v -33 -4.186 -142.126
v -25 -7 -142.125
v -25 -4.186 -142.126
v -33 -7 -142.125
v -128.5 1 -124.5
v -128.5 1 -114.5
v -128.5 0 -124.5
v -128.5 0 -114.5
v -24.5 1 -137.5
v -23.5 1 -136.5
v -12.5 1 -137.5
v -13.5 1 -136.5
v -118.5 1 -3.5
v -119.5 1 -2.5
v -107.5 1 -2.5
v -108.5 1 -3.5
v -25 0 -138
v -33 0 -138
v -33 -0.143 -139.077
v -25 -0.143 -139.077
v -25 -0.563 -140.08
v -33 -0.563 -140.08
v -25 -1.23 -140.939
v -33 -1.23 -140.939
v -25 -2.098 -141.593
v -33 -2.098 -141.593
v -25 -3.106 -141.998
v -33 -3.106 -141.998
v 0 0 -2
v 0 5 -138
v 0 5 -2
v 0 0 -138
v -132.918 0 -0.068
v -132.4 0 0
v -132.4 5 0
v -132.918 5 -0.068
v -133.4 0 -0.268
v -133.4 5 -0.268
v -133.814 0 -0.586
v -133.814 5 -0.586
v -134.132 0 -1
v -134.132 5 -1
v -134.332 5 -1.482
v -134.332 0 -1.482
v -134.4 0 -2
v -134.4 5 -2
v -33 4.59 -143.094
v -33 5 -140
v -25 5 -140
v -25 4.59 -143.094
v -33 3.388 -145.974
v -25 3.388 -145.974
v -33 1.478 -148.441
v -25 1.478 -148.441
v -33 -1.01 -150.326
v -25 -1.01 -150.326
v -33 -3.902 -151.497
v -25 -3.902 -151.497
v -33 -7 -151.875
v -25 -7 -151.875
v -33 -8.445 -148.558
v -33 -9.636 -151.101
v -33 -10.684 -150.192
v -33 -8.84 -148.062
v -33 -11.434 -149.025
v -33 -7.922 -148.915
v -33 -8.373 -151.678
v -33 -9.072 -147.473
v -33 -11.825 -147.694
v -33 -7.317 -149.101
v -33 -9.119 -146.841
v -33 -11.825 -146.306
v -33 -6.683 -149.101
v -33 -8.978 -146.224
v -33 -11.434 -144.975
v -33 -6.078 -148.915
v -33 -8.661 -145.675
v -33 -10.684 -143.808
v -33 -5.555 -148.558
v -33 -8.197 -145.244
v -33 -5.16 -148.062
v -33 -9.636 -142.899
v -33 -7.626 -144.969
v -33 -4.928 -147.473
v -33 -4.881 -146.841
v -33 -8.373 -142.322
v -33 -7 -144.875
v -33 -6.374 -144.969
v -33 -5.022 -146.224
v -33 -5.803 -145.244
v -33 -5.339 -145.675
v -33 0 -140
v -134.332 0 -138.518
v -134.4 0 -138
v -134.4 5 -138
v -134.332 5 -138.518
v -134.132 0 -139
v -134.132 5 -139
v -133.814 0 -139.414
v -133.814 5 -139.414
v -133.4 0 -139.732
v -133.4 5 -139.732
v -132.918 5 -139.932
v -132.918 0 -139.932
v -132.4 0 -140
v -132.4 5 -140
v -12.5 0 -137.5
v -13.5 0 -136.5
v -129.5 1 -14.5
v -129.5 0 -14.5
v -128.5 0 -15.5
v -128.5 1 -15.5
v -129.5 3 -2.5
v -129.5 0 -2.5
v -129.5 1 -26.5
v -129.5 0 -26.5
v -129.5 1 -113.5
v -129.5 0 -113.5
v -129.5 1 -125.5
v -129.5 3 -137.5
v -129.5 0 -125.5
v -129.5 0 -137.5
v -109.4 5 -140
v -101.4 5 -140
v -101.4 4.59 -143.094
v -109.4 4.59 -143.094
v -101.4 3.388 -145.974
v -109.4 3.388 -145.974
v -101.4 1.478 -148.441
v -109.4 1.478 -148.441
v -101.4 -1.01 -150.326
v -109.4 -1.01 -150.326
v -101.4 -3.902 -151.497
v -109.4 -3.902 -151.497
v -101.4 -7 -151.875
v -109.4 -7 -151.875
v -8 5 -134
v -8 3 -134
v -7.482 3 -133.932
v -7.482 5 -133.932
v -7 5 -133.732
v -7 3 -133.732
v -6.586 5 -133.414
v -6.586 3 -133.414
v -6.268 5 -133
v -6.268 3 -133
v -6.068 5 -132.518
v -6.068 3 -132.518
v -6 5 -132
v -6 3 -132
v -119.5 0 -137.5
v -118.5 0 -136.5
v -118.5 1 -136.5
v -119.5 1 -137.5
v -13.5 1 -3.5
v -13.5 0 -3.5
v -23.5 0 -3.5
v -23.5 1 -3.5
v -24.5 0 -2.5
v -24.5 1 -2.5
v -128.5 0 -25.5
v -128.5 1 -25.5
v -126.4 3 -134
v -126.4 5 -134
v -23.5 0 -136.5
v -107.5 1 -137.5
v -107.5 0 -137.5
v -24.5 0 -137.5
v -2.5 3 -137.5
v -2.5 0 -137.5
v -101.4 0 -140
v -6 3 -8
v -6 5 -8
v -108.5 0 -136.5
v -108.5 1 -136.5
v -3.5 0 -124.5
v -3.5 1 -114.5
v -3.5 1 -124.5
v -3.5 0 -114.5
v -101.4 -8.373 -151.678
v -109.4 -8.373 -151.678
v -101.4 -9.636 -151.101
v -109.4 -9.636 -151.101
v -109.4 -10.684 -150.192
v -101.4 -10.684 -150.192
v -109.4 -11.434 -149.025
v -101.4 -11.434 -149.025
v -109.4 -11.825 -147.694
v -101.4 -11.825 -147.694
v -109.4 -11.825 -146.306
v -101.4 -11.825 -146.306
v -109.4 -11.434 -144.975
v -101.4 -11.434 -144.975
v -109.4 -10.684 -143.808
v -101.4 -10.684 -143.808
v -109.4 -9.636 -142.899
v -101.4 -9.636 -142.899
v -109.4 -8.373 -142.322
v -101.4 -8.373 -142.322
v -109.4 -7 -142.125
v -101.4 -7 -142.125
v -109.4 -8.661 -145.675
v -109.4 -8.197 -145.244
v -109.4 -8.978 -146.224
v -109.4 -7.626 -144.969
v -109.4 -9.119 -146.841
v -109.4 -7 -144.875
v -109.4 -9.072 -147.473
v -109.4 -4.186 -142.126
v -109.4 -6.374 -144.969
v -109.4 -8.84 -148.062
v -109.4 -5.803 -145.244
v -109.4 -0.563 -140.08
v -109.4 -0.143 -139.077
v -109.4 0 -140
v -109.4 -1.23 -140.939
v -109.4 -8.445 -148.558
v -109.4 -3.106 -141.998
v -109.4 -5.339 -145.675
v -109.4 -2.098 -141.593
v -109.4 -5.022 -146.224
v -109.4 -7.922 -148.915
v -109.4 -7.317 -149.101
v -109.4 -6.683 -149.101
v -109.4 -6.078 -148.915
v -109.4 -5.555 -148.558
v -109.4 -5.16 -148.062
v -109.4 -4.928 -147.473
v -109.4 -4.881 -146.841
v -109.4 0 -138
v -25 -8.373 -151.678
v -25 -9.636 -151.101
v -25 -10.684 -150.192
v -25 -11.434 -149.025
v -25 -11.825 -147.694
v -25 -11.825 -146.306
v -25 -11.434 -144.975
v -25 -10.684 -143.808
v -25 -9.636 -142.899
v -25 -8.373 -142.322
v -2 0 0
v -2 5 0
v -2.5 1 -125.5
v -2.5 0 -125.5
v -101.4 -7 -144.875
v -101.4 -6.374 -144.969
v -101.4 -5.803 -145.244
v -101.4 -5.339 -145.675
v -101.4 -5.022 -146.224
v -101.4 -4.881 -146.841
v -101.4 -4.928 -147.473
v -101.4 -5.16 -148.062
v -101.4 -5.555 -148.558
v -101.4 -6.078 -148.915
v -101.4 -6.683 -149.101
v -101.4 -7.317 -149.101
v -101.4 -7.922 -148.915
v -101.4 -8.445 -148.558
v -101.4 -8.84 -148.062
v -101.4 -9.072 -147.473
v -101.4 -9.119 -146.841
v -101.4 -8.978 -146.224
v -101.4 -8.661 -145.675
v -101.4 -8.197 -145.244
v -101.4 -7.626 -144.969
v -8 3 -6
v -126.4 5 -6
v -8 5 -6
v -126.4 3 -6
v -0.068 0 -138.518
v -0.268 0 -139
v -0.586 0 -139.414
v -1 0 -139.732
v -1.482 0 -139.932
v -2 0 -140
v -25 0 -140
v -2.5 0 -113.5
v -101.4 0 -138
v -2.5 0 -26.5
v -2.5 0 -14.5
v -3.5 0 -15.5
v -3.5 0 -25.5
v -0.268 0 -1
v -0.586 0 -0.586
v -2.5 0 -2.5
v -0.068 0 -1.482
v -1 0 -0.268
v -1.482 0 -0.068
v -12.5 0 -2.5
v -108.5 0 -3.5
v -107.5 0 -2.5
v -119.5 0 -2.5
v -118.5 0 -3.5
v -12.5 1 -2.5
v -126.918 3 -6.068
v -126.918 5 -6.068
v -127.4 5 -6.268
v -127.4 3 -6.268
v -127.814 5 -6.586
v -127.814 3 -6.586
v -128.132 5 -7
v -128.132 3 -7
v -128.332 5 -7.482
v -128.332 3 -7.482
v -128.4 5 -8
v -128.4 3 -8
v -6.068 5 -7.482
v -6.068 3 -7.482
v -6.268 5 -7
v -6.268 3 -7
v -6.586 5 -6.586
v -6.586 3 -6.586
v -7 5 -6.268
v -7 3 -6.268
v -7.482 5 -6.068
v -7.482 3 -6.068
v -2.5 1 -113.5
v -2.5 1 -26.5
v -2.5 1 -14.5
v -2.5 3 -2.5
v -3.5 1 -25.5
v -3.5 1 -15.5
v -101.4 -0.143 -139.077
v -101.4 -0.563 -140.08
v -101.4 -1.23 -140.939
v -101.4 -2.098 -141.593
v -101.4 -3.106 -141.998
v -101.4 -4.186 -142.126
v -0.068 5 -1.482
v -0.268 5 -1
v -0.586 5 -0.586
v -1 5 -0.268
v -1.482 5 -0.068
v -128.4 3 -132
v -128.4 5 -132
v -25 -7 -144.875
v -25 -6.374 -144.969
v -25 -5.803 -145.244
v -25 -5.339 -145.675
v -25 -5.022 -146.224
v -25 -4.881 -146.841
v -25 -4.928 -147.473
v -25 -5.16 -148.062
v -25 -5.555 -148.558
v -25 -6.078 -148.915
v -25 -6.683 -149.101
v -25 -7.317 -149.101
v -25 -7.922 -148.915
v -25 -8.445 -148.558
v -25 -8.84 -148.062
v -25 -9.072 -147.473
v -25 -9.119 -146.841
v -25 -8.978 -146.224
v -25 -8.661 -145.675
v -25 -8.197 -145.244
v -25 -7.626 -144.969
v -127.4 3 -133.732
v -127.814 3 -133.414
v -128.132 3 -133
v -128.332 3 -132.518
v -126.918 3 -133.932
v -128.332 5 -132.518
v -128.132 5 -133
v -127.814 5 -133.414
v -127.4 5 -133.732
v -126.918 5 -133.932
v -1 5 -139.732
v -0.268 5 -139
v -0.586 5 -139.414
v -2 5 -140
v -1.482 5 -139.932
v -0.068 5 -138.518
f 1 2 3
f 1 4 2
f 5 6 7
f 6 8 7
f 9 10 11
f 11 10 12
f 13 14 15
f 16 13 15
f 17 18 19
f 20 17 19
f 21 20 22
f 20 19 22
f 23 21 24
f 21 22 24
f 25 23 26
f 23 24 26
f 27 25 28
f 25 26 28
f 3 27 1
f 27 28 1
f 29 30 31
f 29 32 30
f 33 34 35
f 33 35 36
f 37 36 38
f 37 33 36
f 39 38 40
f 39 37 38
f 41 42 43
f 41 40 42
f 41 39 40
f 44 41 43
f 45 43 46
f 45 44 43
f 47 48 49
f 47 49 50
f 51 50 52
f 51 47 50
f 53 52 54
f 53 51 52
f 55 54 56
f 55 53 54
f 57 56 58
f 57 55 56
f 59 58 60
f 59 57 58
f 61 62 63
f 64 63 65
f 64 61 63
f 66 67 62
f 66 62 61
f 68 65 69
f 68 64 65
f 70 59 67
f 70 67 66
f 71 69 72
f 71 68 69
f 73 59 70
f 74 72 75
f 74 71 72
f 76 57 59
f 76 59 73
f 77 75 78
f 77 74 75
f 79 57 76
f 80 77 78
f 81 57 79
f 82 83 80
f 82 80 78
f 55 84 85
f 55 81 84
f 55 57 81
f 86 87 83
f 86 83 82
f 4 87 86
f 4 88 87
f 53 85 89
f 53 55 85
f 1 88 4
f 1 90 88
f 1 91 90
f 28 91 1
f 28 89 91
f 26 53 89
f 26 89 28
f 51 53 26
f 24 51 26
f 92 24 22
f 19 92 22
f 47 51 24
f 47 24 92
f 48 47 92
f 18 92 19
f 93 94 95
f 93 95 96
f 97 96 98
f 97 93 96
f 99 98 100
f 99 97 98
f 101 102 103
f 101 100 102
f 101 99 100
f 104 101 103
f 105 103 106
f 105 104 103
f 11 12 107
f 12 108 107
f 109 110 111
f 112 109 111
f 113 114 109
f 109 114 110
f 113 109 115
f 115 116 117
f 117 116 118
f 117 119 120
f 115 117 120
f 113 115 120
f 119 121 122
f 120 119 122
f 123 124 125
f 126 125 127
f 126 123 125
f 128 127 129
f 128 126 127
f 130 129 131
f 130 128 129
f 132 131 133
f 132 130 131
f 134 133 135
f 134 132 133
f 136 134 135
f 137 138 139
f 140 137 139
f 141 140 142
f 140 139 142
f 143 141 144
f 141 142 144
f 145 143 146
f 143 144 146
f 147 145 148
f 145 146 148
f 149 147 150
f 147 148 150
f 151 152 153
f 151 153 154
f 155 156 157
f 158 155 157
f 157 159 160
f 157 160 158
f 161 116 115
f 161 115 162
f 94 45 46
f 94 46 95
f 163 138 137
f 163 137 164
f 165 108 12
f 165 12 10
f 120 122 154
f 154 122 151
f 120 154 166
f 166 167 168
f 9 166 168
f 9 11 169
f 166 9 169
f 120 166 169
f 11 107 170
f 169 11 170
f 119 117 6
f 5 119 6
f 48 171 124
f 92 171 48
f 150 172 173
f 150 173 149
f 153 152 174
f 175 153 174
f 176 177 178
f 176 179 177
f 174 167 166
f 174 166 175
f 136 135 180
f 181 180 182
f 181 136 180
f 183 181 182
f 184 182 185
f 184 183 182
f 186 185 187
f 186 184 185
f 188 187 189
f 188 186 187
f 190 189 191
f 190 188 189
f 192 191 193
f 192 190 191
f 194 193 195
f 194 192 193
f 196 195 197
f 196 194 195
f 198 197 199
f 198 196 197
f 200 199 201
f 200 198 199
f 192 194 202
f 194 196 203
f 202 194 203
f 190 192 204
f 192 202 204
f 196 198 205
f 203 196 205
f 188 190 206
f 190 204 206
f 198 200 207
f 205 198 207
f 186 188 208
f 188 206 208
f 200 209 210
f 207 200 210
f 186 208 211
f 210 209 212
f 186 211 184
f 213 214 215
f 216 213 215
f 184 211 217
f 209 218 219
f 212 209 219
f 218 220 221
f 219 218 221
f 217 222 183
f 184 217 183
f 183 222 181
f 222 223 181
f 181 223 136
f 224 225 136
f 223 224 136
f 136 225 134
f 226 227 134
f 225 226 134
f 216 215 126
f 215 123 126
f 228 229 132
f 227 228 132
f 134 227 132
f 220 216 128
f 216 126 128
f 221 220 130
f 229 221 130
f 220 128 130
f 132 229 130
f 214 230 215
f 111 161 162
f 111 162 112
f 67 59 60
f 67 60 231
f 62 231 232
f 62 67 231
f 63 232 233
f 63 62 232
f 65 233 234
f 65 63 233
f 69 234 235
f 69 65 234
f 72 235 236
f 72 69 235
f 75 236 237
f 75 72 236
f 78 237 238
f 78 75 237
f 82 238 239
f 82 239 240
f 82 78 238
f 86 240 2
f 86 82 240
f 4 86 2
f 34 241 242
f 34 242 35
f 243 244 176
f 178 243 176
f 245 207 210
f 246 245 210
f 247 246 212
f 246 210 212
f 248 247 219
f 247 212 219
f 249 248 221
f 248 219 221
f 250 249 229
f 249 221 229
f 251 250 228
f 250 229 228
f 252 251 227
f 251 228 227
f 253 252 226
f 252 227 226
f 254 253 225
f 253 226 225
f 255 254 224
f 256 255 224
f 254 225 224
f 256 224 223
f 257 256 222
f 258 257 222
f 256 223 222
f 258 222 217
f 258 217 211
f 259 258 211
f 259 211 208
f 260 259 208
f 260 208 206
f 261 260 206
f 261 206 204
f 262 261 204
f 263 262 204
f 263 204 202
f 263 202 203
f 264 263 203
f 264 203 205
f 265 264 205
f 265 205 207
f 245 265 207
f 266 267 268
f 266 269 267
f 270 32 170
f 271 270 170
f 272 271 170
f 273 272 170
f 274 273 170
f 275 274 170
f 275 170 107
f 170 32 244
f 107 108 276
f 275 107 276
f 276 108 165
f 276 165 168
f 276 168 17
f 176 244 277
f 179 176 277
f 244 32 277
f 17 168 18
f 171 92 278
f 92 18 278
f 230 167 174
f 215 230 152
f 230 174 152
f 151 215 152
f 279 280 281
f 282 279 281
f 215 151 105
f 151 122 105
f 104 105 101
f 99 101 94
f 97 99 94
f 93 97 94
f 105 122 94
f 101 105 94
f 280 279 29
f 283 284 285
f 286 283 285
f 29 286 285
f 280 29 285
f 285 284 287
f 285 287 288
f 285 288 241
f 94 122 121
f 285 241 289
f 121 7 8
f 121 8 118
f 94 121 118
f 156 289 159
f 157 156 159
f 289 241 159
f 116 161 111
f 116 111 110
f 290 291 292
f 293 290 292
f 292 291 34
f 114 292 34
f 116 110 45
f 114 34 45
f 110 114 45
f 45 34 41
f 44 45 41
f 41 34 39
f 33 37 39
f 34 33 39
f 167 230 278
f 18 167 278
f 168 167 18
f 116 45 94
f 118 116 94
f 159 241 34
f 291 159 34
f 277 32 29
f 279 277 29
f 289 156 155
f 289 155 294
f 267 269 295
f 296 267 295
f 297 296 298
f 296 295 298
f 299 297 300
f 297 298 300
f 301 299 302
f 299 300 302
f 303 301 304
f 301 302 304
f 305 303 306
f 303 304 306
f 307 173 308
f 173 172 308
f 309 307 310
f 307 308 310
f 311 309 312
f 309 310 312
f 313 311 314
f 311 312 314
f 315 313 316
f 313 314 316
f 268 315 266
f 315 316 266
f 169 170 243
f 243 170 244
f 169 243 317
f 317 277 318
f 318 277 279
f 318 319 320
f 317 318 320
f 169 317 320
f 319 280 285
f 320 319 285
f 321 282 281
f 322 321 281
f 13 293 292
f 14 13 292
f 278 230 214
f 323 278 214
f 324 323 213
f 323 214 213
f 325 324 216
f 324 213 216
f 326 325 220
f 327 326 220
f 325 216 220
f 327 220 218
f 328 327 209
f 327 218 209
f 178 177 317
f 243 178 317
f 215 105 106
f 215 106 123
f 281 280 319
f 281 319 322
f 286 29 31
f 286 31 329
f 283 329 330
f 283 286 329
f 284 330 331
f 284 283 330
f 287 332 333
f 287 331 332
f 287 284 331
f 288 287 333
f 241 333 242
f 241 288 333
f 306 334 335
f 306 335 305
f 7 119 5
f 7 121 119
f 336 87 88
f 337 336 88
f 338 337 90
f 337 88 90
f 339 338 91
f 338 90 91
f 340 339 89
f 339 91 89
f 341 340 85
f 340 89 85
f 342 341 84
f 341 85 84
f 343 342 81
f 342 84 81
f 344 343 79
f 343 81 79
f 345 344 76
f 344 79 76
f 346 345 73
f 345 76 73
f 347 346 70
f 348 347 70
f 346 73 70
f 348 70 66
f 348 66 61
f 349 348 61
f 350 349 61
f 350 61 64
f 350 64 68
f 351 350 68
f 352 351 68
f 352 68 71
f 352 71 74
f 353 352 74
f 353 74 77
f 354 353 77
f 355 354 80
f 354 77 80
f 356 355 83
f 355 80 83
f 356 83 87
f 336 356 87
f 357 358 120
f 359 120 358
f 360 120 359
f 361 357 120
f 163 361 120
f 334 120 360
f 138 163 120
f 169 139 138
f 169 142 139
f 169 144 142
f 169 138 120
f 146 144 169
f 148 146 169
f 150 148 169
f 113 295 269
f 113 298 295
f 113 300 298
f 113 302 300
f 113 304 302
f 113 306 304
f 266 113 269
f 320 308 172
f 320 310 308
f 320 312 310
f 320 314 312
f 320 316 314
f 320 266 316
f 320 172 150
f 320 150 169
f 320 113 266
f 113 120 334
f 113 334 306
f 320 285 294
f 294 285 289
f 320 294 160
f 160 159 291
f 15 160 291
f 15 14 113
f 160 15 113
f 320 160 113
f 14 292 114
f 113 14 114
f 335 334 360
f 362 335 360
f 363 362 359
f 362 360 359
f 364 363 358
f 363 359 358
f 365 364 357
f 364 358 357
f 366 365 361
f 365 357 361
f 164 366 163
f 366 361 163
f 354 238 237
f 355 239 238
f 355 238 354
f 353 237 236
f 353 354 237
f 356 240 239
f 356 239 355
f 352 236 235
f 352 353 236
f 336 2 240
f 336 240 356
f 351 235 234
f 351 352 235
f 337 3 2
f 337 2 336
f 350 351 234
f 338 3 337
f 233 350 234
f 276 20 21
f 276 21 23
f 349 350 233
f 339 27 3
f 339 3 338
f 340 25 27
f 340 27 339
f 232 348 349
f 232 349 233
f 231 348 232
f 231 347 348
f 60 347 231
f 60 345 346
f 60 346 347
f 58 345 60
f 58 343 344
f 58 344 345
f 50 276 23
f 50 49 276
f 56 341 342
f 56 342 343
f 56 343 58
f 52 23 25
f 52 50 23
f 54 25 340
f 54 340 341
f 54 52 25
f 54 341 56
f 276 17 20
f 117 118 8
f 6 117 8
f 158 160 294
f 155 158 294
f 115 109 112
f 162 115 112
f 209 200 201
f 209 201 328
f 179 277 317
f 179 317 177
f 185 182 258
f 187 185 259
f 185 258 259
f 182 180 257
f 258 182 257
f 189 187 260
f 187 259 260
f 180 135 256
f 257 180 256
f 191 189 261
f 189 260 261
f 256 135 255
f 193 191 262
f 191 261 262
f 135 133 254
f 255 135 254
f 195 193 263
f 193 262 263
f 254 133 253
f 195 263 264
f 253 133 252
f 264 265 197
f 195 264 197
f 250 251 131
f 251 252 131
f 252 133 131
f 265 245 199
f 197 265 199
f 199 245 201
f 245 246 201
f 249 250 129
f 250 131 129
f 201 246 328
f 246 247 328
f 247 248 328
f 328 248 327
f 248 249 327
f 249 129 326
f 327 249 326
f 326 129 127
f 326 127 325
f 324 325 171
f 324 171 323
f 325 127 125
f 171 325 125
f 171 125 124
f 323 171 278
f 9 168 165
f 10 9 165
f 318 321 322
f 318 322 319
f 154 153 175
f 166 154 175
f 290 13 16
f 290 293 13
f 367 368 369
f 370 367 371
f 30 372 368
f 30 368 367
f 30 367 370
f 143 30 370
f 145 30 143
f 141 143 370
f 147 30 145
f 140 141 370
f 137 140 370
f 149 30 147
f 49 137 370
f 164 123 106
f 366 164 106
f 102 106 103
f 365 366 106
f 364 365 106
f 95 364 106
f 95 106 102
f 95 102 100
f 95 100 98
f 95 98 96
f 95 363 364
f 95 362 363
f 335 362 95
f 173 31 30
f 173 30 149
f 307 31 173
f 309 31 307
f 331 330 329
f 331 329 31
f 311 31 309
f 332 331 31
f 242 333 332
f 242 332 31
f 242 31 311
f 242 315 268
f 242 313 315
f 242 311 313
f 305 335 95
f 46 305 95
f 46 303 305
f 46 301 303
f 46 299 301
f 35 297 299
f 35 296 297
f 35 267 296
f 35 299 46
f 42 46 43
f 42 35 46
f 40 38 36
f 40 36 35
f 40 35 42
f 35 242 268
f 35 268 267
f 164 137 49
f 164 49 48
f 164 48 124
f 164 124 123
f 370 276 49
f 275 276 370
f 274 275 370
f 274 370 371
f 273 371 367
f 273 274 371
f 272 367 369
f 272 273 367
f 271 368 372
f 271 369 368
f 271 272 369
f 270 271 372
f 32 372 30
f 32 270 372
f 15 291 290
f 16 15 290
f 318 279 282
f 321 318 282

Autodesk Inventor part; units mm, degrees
ref_plane "YZ Plane" through (0, 0, 0) normal (1, 0, 0) x (0, 1, 0)
ref_plane "XZ Plane" through (0, 0, 0) normal (0, 1, 0) x (-1, 0, 0)
ref_plane "XY Plane" through (0, 0, 0) normal (0, 0, 1) x (1, 0, 0)
sketch "Boceto1" plane through (0, 0, 0) normal (0, 1, 0) x (-1, 0, 0)
  line L0 (2, 0) -> (132.4, 0)
  line L1 (134.4, -2) -> (134.4, -138)
  line L2 (132.4, -140) -> (2, -140)
  line L3 (0, -138) -> (0, -2)
  arc A0 (134.4, -2) -> (132.4, 0) centre (132.4, -2) ccw
  arc A1 (132.4, -140) -> (134.4, -138) centre (132.4, -138) ccw
  arc A2 (0, -138) -> (2, -140) centre (2, -138) ccw
  arc A3 (2, 0) -> (0, -2) centre (2, -2) ccw
  line L4 (126.4, -6) -> (8, -6)
  line L5 (6, -8) -> (6, -132)
  line L6 (8, -134) -> (126.4, -134)
  line L7 (128.4, -132) -> (128.4, -8)
  arc A4 (8, -6) -> (6, -8) centre (8, -8) ccw
  arc A5 (6, -132) -> (8, -134) centre (8, -132) ccw
  arc A6 (126.4, -134) -> (128.4, -132) centre (126.4, -132) ccw
  arc A7 (128.4, -8) -> (126.4, -6) centre (126.4, -8) ccw
  line L8 (67.2, -140) -> (67.2, 0) construction
  line L9 (134.4, -140) -> (109.4, -140) construction
  line L10 (109.4, -140) -> (101.4, -140) construction
  line L11 (101.4, -140) -> (101.4, -152)
  line L12 (101.4, -152) -> (109.4, -152)
  line L13 (109.4, -152) -> (109.4, -140)
  line L14 (0, -140) -> (25, -140) construction
  line L15 (25, -140) -> (33, -140) construction
  line L16 (33, -140) -> (33, -152)
  line L17 (33, -152) -> (25, -152)
  line L18 (25, -152) -> (25, -140)
  point P0 (0, 0)
  point P1 (134.4, 0)
  point P2 (25, -140)
  point P3 (101.4, -140)
  dimension "d0" = 134.4
  dimension "d1" = 140
  dimension "d2" = 2
  dimension "d3" = 6
  dimension "d4" = 2
  dimension "d7" = 25
  dimension "d8" = 8
  dimension "d9" = 12
extrude "Extrusión1" add sketch "Boceto1" along normal blind 5
sketch "Boceto2" plane through (0, 0, 0) normal (0, -1, 0) x (1, 0, 0)
  line L0 (-25, -140) -> (-25, -152) projected
  line L1 (-33, -140) -> (-101.4, -140) projected
  line L2 (-25, -152) -> (-33, -152)
  line L3 (-33, -152) -> (-33, -140)
  line L4 (-33, -140) -> (-25, -140)
  line L5 (-25, -140) -> (-25, -152)
  line L6 (-101.4, -152) -> (-109.4, -152) projected
  line L7 (-109.4, -152) -> (-101.4, -152)
  line L8 (-101.4, -152) -> (-101.4, -140)
  line L9 (-101.4, -140) -> (-109.4, -140)
  line L10 (-109.4, -140) -> (-109.4, -152)
  line L11 (-109.4, -140) -> (-101.4, -140)
  line L12 (-101.4, -140) -> (-101.4, -136)
  line L13 (-101.4, -136) -> (-109.4, -136)
  line L14 (-109.4, -136) -> (-109.4, -140)
  line L15 (-33, -140) -> (-25, -140)
  line L16 (-25, -140) -> (-25, -136)
  line L17 (-25, -136) -> (-33, -136)
  line L18 (-33, -136) -> (-33, -140)
  point P0 (0, 0)
  dimension "d18" = 4
  dimension "d19" = 8
  dimension "d20" = 4
extrude "Extrusión2" add sketch "Boceto2" along normal blind 18
sketch "Boceto3" plane through (-109.4, 5, -152) normal (-1, 0, 0) x (0, 0, 1)
  line L0 (14, -5) -> (12, -5) construction
  line L1 (0, -23) -> (0, 0) projected
  line L2 (12, -5) -> (0, -5) construction
  line L3 (0, -5) -> (0, -12) construction
  line L4 (12, -12) -> (12, -5) construction
  circle A0 centre (5, -12) radius 2.125
  circle A1 centre (5, -12) radius 4.875 construction
  arc A2 (0.125, -12) -> (9.875, -12) centre (5, -12) ccw
  line L5 (0.125, -12) -> (0.125, 0) construction
  line L6 (12, 0) -> (0, 0) construction
  line L7 (12, -5) -> (12, 0) construction
  line L8 (9.8743, -12.0803) -> (9.8743, -5) construction
  line L9 (12, -5) -> (5, -5) construction
  line L10 (5, -5) -> (5, -12) construction
  line L11 (5, -12) -> (12, -12) construction
  line L12 (12, -12) -> (12, -5) construction
  line L13 (14, -5) -> (14, -23) construction
  line L14 (16, -23) -> (0, -23) projected
  line L15 (12, -5) -> (14, -5) construction
  line L16 (14, -5) -> (14, -7) construction
  line L17 (14, -7) -> (12, -7) construction
  line L18 (12, -7) -> (12, -5) construction
  arc A3 (14, -5) -> (12, -7) centre (14, -7) ccw construction
  line L19 (14, 0) -> (150, 0) projected
  line L20 (12, 0) -> (14, 0)
  arc A4 (12, 0) -> (0.125, -12) centre (12, -11.8757) ccw
  line L21 (14, -5) -> (16, -5)
  arc A5 (14, -5) -> (9.8743, -9.1856) centre (14, -9.1261) ccw
  line L22 (9.8743, -12.0803) -> (9.8743, -9.1856)
  line L23 (0.125, 0) -> (14, 0)
  line L24 (14, 0) -> (14, -23)
  line L25 (14, -23) -> (0, -23)
  line L26 (16, -23) -> (14, -23)
  line L27 (14, -23) -> (14, -5)
  line L28 (14, -5) -> (16, -5)
  line L29 (16, -5) -> (16, -23)
  line L30 (0.125, 0) -> (-6.5711, 0)
  line L31 (-6.5711, 0) -> (-6.5711, -23)
  line L32 (-6.5711, -23) -> (16, -23)
  point P0 (152, -5)
  point P1 (9.8743, -9.1856)
  point P2 (9.8743, -12.0803)
  point P3 (0, -10.3846)
  point P4 (0, -13.125)
  point P5 (12, 0)
  point P6 (0, 0)
  point P7 (14, -5)
  point P8 (14, -5)
  dimension "d13" = 4.25
  dimension "d14" = 2.75
  dimension "d16" = 7
  dimension "d17" = 7
  dimension "d21" = 2
extrude "Extrusión3" cut sketch "Boceto3" against normal blind 150 contours L1 L30 L23 A4 A2 L22 A5 L24 L14 | L24 L21 L29 L14 | A0
sketch "Boceto4" plane through (0, 0, 0) normal (0, -1, 0) x (1, 0, 0)
  line L0 (0, 0) -> (-132, 0)
  line L1 (-132, 0) -> (-132, -140)
  line L2 (-132, -140) -> (0, -140)
  line L3 (0, -140) -> (0, 0)
  line L4 (-2.5, -2.5) -> (-129.5, -2.5)
  line L5 (-129.5, -2.5) -> (-129.5, -137.5)
  line L6 (-129.5, -137.5) -> (-2.5, -137.5)
  line L7 (-2.5, -137.5) -> (-2.5, -2.5)
  dimension "d27" = 132
  dimension "d28" = 140
  dimension "d29" = 2.5
extrude "Extrusión4" cut sketch "Boceto4" against normal blind 3 contours L7 L6 L5 L4
sketch "Boceto5" plane through (0, 0, 0) normal (0, -1, 0) x (1, 0, 0)
  line L0 (-129.5, -137.5) -> (-129.5, -2.5) projected
  line L1 (-2.5, -2.5) -> (-2.5, -137.5) projected
  line L2 (-129.5, -137.5) -> (-2.5, -137.5)
  line L3 (-2.5, -137.5) -> (-2.5, -2.5)
  line L4 (-2.5, -2.5) -> (-129.5, -2.5)
  line L5 (-129.5, -2.5) -> (-129.5, -137.5)
  line L6 (-2.5, -137.5) -> (-129.5, -137.5) projected
  line L7 (-66, -137.5) -> (-66, -2.5) construction
  line L8 (-33, -140) -> (-101.4, -140) construction
  line L9 (-2.5, -70) -> (-129.5, -70) construction
  line L10 (-118.5, -137.5) -> (-107.5, -137.5) construction
  line L11 (-118.5, -137.5) -> (-108.5, -137.5) construction
  line L12 (-108.5, -137.5) -> (-108.5, -136.5) construction
  line L13 (-108.5, -136.5) -> (-118.5, -136.5) construction
  line L14 (-118.5, -136.5) -> (-118.5, -137.5) construction
  line L15 (-118.5, -137.5) -> (-119.5, -137.5) construction
  line L16 (-119.5, -137.5) -> (-118.5, -136.5) construction
  line L17 (-108.5, -137.5) -> (-107.5, -137.5) construction
  line L18 (-107.5, -137.5) -> (-108.5, -136.5) construction
  line L19 (-107.5, -137.5) -> (-108.5, -136.5)
  line L20 (-118.5, -136.5) -> (-119.5, -137.5)
  line L21 (-118.5, -136.5) -> (-108.5, -136.5)
  line L22 (-129.5, -124.5) -> (-128.5, -124.5) construction
  line L23 (-128.5, -124.5) -> (-128.5, -114.5) construction
  line L24 (-128.5, -114.5) -> (-129.5, -114.5) construction
  line L25 (-129.5, -114.5) -> (-129.5, -124.5) construction
  line L26 (-129.5, -124.5) -> (-129.5, -125.5) construction
  line L27 (-129.5, -125.5) -> (-128.5, -124.5) construction
  line L28 (-129.5, -114.5) -> (-129.5, -113.5) construction
  line L29 (-129.5, -113.5) -> (-128.5, -114.5) construction
  line L30 (-129.5, -125.5) -> (-128.5, -124.5)
  line L31 (-128.5, -114.5) -> (-128.5, -124.5)
  line L32 (-129.5, -113.5) -> (-128.5, -114.5)
  line L33 (-107.5, -137.5) -> (-119.5, -137.5)
  line L34 (-129.5, -125.5) -> (-129.5, -113.5)
  line L35 (-118.5, -2.5) -> (-107.5, -2.5) construction
  line L36 (-118.5, -2.5) -> (-108.5, -2.5) construction
  line L37 (-108.5, -2.5) -> (-108.5, -3.5) construction
  line L38 (-108.5, -3.5) -> (-118.5, -3.5) construction
  line L39 (-118.5, -3.5) -> (-118.5, -2.5) construction
  line L40 (-118.5, -2.5) -> (-119.5, -2.5) construction
  line L41 (-119.5, -2.5) -> (-118.5, -3.5) construction
  line L42 (-108.5, -2.5) -> (-107.5, -2.5) construction
  line L43 (-107.5, -2.5) -> (-108.5, -3.5) construction
  line L44 (-107.5, -2.5) -> (-108.5, -3.5)
  line L45 (-118.5, -3.5) -> (-119.5, -2.5)
  line L46 (-118.5, -3.5) -> (-108.5, -3.5)
  line L47 (-129.5, -15.5) -> (-128.5, -15.5) construction
  line L48 (-128.5, -15.5) -> (-128.5, -25.5) construction
  line L49 (-128.5, -25.5) -> (-129.5, -25.5) construction
  line L50 (-129.5, -25.5) -> (-129.5, -15.5) construction
  line L51 (-129.5, -15.5) -> (-129.5, -14.5) construction
  line L52 (-129.5, -14.5) -> (-128.5, -15.5) construction
  line L53 (-129.5, -25.5) -> (-129.5, -26.5) construction
  line L54 (-129.5, -26.5) -> (-128.5, -25.5) construction
  line L55 (-129.5, -14.5) -> (-128.5, -15.5)
  line L56 (-128.5, -25.5) -> (-128.5, -15.5)
  line L57 (-129.5, -26.5) -> (-128.5, -25.5)
  line L58 (-107.5, -2.5) -> (-119.5, -2.5)
  line L59 (-129.5, -14.5) -> (-129.5, -26.5)
  line L60 (-2.5, -137.5) -> (-2.5, -2.5)
  line L61 (-2.5, -2.5) -> (-2.5, -137.5)
  line L62 (-13.5, -137.5) -> (-24.5, -137.5) construction
  line L63 (-13.5, -137.5) -> (-23.5, -137.5) construction
  line L64 (-23.5, -137.5) -> (-23.5, -136.5) construction
  line L65 (-23.5, -136.5) -> (-13.5, -136.5) construction
  line L66 (-13.5, -136.5) -> (-13.5, -137.5) construction
  line L67 (-13.5, -137.5) -> (-12.5, -137.5) construction
  line L68 (-12.5, -137.5) -> (-13.5, -136.5) construction
  line L69 (-23.5, -137.5) -> (-24.5, -137.5) construction
  line L70 (-24.5, -137.5) -> (-23.5, -136.5) construction
  line L71 (-24.5, -137.5) -> (-23.5, -136.5)
  line L72 (-13.5, -136.5) -> (-12.5, -137.5)
  line L73 (-13.5, -136.5) -> (-23.5, -136.5)
  line L74 (-2.5, -124.5) -> (-3.5, -124.5) construction
  line L75 (-3.5, -124.5) -> (-3.5, -114.5) construction
  line L76 (-3.5, -114.5) -> (-2.5, -114.5) construction
  line L77 (-2.5, -114.5) -> (-2.5, -124.5) construction
  line L78 (-2.5, -124.5) -> (-2.5, -125.5) construction
  line L79 (-2.5, -125.5) -> (-3.5, -124.5) construction
  line L80 (-2.5, -114.5) -> (-2.5, -113.5) construction
  line L81 (-2.5, -113.5) -> (-3.5, -114.5) construction
  line L82 (-2.5, -125.5) -> (-3.5, -124.5)
  line L83 (-3.5, -114.5) -> (-3.5, -124.5)
  line L84 (-2.5, -113.5) -> (-3.5, -114.5)
  line L85 (-24.5, -137.5) -> (-12.5, -137.5)
  line L86 (-2.5, -125.5) -> (-2.5, -113.5)
  line L87 (-3.5, -25.5) -> (-2.5, -25.5) construction
  line L88 (-2.5, -26.5) -> (-3.5, -25.5) construction
  line L89 (-2.5, -26.5) -> (-3.5, -25.5)
  line L90 (-2.5, -15.5) -> (-3.5, -15.5) construction
  line L91 (-2.5, -25.5) -> (-2.5, -15.5) construction
  line L92 (-2.5, -14.5) -> (-3.5, -15.5) construction
  line L93 (-2.5, -14.5) -> (-3.5, -15.5)
  line L94 (-2.5, -14.5) -> (-2.5, -26.5)
  line L95 (-2.5, -25.5) -> (-2.5, -26.5) construction
  line L96 (-3.5, -15.5) -> (-3.5, -25.5) construction
  line L97 (-3.5, -25.5) -> (-3.5, -15.5)
  line L98 (-2.5, -15.5) -> (-2.5, -14.5) construction
  line L99 (-13.5, -2.5) -> (-24.5, -2.5) construction
  line L100 (-13.5, -2.5) -> (-12.5, -2.5) construction
  line L101 (-12.5, -2.5) -> (-13.5, -3.5) construction
  line L102 (-13.5, -3.5) -> (-12.5, -2.5)
  line L103 (-23.5, -3.5) -> (-13.5, -3.5) construction
  line L104 (-13.5, -3.5) -> (-23.5, -3.5)
  line L105 (-13.5, -2.5) -> (-23.5, -2.5) construction
  line L106 (-23.5, -2.5) -> (-23.5, -3.5) construction
  line L107 (-24.5, -2.5) -> (-12.5, -2.5)
  line L108 (-23.5, -2.5) -> (-24.5, -2.5) construction
  line L109 (-24.5, -2.5) -> (-23.5, -3.5) construction
  line L110 (-24.5, -2.5) -> (-23.5, -3.5)
  line L111 (-13.5, -3.5) -> (-13.5, -2.5) construction
  point P0 (0, 0)
  point P1 (-101.4, 0)
  point P2 (-30.6, 0)
  dimension "d32" = 11
  dimension "d33" = 13
  dimension "d36" = 10
  dimension "d37" = 1
  dimension "d38" = 1
  dimension "d40" = 1
  dimension "d41" = 1
  dimension "d42" = 10
  dimension "d43" = 1
  dimension "d44" = 1
extrude "Extrusión5" add sketch "Boceto5" against normal blind 1 contours L0 L32 L31 L30 | L20 L21 L19 L2 | L0 L55 L56 L57 | L71 L73 L72 L2 | L4 L44 L46 L45 | L82 L83 L84 L1 | L4 L102 L104 L110 | L89 L97 L93 L1
